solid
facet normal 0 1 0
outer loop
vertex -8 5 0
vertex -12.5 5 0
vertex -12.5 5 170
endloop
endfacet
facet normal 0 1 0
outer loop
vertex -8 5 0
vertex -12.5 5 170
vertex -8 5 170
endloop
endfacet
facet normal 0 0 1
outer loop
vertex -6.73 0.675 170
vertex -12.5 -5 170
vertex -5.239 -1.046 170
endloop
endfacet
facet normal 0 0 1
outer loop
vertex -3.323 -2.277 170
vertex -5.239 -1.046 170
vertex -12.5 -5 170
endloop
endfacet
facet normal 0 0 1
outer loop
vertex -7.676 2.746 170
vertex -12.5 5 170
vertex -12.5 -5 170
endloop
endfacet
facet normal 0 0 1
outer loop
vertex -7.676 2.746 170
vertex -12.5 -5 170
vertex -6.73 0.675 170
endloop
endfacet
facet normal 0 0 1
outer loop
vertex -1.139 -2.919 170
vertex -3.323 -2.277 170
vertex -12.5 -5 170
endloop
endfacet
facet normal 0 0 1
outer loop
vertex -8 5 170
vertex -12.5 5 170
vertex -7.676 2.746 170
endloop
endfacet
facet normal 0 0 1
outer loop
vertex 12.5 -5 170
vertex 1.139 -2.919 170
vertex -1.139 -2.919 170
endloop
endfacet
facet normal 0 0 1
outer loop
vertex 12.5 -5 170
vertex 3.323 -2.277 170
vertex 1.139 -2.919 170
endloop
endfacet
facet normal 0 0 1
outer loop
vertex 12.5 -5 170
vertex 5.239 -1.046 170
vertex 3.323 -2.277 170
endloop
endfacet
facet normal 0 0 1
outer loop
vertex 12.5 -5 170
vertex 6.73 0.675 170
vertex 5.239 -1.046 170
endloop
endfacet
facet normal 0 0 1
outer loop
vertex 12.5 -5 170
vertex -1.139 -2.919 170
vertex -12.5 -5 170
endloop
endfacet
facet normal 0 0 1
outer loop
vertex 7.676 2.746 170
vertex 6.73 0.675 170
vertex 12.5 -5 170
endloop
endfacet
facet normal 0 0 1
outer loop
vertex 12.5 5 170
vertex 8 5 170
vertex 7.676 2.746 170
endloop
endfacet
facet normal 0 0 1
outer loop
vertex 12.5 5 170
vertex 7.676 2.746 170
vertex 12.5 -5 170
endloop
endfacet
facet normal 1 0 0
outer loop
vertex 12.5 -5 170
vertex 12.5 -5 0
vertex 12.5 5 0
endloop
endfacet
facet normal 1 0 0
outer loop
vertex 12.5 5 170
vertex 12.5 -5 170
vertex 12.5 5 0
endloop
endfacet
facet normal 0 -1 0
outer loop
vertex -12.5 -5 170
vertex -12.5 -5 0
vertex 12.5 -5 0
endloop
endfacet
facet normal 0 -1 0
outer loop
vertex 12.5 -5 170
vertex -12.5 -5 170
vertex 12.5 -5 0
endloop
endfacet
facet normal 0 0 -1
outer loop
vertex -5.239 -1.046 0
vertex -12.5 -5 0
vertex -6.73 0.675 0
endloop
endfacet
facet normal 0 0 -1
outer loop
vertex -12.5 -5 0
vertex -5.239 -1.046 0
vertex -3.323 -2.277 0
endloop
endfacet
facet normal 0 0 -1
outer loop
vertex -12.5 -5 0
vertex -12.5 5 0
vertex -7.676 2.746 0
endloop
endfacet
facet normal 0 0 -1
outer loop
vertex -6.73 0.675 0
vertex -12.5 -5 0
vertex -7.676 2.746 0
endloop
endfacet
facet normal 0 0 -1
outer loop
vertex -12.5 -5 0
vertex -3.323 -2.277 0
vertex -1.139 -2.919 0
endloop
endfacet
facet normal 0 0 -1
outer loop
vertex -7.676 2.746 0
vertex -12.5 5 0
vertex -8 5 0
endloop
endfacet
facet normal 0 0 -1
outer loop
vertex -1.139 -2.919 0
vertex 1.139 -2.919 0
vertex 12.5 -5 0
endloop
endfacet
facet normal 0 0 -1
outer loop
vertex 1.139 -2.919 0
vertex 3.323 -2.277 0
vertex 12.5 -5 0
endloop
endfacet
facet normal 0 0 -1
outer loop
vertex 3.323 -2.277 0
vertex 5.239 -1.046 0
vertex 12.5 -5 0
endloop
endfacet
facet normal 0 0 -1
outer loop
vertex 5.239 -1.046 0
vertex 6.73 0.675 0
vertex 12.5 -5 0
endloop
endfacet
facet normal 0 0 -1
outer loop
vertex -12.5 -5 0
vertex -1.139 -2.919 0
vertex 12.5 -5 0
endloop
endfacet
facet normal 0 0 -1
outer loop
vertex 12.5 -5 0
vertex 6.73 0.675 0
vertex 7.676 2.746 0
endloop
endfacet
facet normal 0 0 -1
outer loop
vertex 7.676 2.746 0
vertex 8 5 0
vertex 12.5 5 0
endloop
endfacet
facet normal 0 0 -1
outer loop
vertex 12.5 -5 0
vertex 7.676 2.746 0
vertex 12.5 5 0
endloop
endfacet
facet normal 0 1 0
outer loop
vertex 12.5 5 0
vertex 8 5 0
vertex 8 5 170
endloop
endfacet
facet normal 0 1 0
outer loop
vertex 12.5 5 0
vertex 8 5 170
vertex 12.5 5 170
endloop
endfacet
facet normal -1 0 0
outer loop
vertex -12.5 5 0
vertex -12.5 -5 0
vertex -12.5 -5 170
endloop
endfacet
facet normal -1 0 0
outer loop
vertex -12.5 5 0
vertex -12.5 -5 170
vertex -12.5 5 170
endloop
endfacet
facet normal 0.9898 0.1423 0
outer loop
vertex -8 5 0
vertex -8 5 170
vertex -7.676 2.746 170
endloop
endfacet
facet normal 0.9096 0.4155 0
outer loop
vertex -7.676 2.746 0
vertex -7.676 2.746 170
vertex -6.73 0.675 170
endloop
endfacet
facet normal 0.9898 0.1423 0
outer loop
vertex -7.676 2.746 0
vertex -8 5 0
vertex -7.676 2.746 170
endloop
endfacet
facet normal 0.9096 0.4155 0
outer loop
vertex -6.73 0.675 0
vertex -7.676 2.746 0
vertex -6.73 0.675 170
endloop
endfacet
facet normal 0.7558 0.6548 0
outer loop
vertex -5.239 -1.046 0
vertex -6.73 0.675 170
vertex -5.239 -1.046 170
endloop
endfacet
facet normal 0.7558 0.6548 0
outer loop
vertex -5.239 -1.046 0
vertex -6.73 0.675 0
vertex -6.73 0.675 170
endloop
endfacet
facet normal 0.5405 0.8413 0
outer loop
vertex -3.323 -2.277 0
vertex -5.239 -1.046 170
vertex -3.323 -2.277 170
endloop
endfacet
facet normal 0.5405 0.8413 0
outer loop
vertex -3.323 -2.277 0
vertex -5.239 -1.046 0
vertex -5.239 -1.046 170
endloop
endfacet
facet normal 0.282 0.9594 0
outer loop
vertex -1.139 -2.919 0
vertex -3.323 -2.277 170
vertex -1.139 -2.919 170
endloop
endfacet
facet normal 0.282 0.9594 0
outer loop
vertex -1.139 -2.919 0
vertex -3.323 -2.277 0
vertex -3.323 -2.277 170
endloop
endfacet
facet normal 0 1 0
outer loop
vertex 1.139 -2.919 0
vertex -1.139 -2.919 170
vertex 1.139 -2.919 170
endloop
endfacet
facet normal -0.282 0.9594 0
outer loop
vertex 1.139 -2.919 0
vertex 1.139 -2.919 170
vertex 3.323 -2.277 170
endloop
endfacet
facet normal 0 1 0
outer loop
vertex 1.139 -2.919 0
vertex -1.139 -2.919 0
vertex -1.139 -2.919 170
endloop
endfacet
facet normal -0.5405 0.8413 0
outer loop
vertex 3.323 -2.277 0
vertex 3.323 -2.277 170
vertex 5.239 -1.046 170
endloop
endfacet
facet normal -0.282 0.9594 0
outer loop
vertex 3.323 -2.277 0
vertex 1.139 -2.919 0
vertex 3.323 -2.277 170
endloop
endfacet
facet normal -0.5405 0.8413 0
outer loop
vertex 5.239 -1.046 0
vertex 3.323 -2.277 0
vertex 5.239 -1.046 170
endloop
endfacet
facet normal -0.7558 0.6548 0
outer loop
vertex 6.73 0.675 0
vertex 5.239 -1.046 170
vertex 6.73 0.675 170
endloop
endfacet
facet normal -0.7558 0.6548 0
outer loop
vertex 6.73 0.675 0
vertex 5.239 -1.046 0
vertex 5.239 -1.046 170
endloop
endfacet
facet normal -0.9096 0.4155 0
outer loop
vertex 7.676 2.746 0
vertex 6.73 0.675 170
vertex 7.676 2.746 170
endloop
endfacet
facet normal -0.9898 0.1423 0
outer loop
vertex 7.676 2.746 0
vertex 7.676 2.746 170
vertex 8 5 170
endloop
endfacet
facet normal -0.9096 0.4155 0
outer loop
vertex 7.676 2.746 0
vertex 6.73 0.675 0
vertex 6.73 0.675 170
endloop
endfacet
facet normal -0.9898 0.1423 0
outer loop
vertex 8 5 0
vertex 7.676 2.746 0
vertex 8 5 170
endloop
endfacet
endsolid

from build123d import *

# Parameters (mm, degrees)
SKETCH2_W           = 25
SKETCH2_H           = 10
BOSS_EXTRUDE1_DEPTH = 170
CUT_EXTRUDE1_DEPTH  = 170


with BuildPart() as part:
    # Sketch2 → Boss-Extrude1 (new body)
    with BuildSketch(Plane.XY):
        Rectangle(SKETCH2_W, SKETCH2_H)
    extrude(amount=BOSS_EXTRUDE1_DEPTH)

    # Sketch3 → Cut-Extrude1 (cut)
    with BuildSketch(Plane(origin=(0, 0, 0), x_dir=(-1, 0, 0), z_dir=(0, 0, -1))):
        with BuildLine():
            Line((-8, 5), (8, 5))
            ThreePointArc((8, 5), (0, -3), (-8, 5))
        make_face()
    extrude(amount=-CUT_EXTRUDE1_DEPTH, mode=Mode.SUBTRACT)


solid = part.part
